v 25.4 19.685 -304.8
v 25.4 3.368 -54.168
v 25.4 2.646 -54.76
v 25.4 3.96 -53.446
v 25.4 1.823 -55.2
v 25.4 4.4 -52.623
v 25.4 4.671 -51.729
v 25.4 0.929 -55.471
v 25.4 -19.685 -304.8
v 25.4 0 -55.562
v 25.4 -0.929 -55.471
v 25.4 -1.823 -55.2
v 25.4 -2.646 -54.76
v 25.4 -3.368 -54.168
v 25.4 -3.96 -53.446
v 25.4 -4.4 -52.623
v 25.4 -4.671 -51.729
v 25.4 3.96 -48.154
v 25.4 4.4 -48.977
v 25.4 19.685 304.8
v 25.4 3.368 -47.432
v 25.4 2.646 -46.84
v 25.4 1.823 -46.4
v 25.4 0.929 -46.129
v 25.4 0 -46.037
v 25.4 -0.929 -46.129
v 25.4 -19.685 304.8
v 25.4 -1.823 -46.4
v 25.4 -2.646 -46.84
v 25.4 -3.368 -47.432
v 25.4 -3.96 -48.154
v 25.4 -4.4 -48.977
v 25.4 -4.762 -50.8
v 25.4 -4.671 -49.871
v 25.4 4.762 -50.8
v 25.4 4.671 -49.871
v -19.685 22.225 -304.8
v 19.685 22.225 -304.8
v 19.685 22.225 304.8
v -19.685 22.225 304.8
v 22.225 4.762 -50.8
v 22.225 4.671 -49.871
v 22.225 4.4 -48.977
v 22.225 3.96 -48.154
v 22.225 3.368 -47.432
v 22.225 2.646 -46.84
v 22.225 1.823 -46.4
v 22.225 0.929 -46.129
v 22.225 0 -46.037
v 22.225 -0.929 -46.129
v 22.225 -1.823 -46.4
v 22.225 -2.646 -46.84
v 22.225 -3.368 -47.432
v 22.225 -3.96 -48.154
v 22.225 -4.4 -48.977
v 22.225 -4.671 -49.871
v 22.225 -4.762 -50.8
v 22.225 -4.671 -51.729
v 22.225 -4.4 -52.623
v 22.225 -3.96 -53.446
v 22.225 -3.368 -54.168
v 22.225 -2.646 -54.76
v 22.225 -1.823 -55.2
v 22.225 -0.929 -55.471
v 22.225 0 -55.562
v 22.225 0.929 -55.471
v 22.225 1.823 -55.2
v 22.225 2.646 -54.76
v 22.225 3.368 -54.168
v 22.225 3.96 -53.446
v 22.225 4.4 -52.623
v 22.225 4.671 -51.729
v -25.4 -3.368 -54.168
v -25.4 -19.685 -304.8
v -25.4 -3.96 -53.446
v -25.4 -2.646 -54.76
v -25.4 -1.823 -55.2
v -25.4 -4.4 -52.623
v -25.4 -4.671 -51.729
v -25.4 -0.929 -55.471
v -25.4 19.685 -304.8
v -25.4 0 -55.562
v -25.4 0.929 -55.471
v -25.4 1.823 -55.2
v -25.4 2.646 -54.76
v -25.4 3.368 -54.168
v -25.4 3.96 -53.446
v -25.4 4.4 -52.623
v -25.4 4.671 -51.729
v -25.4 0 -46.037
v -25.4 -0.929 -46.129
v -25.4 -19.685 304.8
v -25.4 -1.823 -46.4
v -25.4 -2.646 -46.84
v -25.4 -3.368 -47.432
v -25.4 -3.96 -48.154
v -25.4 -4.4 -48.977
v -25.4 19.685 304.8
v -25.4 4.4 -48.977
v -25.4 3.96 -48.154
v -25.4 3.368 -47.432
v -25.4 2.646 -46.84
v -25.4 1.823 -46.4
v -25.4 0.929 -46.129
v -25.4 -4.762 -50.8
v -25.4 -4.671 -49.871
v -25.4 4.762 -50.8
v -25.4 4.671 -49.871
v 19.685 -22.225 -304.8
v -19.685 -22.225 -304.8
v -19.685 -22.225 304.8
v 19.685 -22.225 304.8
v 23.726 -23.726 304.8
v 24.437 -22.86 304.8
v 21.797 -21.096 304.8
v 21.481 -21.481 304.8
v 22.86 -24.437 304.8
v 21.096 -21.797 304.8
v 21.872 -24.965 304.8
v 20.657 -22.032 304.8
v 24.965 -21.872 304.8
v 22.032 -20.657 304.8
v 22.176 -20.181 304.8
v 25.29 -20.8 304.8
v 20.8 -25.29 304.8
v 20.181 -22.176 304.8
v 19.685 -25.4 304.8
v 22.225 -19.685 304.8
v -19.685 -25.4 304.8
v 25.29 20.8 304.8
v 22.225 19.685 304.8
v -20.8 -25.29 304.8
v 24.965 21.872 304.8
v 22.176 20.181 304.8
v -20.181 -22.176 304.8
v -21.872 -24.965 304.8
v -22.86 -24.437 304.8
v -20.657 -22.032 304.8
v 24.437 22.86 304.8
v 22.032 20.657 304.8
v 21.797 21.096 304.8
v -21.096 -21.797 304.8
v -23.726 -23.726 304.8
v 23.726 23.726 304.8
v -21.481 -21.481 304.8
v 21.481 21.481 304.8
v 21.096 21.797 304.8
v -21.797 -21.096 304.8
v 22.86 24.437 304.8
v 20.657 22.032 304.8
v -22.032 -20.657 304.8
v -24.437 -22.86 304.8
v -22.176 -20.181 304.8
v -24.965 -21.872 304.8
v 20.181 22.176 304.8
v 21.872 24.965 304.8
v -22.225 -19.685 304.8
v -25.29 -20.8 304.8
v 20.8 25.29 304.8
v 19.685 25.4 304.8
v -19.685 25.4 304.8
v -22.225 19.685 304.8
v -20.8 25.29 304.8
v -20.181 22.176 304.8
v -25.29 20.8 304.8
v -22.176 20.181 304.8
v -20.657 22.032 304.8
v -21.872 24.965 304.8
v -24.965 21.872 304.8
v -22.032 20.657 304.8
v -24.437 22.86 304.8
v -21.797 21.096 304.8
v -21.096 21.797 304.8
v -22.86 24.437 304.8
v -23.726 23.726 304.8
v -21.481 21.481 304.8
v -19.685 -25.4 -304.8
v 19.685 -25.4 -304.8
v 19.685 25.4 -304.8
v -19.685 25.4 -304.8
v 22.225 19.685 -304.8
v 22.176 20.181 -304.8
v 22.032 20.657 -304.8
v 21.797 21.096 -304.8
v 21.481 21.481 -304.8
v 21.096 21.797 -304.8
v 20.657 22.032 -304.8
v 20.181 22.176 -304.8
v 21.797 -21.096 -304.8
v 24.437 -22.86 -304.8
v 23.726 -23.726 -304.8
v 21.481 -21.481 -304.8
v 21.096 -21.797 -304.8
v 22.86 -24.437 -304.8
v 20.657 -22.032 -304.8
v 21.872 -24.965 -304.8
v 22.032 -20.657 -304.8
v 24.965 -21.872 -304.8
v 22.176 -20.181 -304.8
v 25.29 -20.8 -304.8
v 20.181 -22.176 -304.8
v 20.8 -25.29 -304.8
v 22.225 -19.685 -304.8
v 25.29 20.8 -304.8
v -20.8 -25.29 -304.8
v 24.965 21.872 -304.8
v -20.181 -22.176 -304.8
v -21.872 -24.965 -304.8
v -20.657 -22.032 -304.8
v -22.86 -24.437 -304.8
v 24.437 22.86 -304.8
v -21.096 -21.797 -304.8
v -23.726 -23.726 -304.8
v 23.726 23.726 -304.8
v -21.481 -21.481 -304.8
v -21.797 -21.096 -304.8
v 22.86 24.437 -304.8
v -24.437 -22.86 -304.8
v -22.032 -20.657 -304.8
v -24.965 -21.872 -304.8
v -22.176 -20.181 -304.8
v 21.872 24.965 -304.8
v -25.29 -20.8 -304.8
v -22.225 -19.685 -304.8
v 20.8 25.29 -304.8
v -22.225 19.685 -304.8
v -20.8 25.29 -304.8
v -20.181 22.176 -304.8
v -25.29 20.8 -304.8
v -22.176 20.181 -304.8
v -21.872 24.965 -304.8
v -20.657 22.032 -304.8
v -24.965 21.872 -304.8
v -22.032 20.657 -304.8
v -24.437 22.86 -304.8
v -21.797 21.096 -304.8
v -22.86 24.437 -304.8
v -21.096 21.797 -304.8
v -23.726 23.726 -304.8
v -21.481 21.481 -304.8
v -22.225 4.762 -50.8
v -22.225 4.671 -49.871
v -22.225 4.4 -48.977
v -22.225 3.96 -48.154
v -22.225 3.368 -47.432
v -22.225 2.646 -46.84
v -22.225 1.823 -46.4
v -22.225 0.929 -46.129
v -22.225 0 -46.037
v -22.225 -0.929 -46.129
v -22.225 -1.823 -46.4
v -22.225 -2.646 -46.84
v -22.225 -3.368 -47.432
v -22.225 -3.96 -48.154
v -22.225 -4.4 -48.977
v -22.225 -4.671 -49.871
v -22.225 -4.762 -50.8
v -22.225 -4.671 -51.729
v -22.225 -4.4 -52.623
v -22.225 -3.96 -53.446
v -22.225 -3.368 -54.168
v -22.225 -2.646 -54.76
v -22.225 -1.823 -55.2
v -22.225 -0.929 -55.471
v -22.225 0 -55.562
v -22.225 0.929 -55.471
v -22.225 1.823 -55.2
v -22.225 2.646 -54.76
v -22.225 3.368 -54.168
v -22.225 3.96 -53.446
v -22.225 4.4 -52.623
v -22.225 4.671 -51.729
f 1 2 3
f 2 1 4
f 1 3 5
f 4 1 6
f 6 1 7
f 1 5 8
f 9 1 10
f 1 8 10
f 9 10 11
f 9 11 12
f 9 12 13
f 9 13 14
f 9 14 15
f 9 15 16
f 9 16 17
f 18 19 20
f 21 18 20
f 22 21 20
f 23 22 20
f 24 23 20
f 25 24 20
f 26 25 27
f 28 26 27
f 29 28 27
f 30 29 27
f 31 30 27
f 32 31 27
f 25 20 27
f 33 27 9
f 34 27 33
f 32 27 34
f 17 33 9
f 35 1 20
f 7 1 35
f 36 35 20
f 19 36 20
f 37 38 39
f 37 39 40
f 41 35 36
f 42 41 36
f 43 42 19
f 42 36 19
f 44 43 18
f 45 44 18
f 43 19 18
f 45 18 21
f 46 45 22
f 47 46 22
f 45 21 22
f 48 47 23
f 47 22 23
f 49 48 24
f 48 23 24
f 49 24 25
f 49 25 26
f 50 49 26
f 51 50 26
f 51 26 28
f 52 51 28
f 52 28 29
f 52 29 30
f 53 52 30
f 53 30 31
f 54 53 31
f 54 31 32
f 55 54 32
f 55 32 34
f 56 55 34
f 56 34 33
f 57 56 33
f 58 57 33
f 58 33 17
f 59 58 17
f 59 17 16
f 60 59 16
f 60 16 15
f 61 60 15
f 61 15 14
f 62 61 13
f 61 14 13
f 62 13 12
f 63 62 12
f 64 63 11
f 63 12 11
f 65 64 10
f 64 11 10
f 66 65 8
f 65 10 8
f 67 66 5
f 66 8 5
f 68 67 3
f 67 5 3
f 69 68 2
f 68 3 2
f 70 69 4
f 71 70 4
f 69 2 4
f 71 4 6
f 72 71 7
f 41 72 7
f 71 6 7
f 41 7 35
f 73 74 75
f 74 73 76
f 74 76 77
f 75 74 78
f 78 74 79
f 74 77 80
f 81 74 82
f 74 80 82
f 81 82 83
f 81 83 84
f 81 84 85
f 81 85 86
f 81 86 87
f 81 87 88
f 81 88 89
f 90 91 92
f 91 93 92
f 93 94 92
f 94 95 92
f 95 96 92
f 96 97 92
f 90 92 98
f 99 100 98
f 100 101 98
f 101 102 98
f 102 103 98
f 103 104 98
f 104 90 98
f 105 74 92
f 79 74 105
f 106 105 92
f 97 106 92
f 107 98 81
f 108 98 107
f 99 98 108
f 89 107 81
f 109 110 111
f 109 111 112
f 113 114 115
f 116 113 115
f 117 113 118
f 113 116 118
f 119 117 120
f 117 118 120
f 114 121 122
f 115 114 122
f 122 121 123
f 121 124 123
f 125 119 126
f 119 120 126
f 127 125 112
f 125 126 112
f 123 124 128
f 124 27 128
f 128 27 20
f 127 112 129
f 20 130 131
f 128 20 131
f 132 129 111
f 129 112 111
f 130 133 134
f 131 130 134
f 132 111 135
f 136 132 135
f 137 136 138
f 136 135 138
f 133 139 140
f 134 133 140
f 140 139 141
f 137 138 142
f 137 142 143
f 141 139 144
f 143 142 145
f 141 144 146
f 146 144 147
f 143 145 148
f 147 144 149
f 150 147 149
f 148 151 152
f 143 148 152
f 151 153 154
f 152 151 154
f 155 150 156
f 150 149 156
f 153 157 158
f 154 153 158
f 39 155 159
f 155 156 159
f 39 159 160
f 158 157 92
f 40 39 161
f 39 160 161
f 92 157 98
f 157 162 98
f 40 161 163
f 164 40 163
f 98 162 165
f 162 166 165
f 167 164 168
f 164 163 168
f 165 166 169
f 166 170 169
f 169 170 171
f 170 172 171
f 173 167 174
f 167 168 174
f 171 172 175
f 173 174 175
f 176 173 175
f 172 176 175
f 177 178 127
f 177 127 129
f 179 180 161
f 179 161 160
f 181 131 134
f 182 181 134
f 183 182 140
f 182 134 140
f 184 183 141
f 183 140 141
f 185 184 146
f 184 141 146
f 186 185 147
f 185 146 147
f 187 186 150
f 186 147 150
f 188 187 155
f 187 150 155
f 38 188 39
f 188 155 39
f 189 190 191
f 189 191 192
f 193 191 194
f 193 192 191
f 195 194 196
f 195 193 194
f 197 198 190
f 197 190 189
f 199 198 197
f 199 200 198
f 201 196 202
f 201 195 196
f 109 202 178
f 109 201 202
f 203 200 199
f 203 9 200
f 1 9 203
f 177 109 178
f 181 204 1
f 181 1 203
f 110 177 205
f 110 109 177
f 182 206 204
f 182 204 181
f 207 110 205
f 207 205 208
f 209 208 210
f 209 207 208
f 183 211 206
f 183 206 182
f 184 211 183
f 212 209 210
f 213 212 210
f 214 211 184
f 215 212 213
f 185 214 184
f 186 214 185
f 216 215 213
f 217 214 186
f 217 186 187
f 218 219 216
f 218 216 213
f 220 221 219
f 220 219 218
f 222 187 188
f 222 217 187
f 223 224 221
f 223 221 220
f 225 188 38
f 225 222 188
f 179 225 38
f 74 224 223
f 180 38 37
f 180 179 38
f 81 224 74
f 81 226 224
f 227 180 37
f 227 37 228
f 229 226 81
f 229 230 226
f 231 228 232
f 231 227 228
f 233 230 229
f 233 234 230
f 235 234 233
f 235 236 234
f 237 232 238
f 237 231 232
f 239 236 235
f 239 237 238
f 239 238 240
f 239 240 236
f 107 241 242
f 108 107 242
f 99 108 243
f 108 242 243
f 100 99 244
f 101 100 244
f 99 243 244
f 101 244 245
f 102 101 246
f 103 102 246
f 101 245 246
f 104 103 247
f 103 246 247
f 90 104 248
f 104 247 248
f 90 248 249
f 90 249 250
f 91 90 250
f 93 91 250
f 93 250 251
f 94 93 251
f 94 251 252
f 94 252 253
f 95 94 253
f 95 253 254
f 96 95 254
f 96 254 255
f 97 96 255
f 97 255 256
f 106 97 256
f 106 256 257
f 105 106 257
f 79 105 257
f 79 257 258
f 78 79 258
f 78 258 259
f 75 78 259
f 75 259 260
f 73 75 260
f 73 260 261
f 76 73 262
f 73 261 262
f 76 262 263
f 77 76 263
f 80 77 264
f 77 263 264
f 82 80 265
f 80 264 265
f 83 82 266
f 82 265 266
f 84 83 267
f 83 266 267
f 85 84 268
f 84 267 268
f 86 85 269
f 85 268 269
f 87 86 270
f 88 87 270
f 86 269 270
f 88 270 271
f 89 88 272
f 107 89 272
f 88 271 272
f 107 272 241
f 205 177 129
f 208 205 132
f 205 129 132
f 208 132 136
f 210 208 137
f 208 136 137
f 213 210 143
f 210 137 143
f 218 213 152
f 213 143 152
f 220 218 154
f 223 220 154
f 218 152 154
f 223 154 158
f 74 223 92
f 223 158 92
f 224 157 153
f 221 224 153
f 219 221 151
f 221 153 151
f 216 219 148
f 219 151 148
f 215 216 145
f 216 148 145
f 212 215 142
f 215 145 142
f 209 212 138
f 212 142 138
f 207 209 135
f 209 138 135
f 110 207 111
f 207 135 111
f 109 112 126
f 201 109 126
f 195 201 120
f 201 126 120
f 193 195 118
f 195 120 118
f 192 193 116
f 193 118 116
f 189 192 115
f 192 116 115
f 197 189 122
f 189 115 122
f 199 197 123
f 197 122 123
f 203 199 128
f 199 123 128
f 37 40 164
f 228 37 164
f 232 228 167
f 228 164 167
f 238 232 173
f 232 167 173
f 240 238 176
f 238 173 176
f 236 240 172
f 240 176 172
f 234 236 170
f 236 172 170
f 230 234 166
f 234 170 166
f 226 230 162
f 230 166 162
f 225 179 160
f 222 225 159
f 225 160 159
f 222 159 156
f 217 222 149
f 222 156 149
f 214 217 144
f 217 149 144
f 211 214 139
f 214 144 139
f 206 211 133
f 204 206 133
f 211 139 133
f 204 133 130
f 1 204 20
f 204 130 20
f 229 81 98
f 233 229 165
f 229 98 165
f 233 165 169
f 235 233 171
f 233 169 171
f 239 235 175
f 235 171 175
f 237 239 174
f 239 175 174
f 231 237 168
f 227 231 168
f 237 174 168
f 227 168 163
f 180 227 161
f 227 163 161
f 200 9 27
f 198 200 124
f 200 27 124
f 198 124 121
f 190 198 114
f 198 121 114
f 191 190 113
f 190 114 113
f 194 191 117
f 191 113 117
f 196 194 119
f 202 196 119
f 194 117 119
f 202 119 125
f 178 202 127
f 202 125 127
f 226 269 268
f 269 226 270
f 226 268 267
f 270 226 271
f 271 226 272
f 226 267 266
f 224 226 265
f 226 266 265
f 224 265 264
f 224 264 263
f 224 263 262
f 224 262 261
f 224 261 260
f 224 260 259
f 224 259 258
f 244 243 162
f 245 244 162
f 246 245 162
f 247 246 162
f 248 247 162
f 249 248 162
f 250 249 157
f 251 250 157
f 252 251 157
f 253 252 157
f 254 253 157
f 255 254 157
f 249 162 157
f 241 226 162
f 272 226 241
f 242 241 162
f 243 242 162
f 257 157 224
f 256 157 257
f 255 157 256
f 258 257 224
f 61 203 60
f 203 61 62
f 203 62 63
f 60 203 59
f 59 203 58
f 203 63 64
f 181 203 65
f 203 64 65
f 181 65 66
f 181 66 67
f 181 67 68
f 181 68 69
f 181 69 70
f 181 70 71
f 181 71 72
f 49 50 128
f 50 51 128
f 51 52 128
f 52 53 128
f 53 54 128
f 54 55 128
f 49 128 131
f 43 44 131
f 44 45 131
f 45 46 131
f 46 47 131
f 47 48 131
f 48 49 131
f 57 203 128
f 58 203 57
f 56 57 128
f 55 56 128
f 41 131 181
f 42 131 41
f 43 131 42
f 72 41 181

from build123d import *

# Parameters (mm, degrees)
BOSS_EXTRUDE1_DEPTH = 304.8
SKETCH3_R           = 4.7625
CUT_EXTRUDE2_DEPTH  = 76.2


with BuildPart() as part:
    # Sketch1 → Boss-Extrude1 (new, symmetric)
    with BuildSketch(Plane.XY):
        with BuildLine():
            Line((-19.685, 25.4), (19.685, 25.4))
            ThreePointArc((19.685, 25.4), (23.726115254, 23.726115254), (25.4, 19.685))
            Line((25.4, 19.685), (25.4, -19.685))
            ThreePointArc((25.4, -19.685), (23.726115254, -23.726115254), (19.685, -25.4))
            Line((19.685, -25.4), (-19.685, -25.4))
            ThreePointArc((-19.685, -25.4), (-23.726115254, -23.726115254), (-25.4, -19.685))
            Line((-25.4, -19.685), (-25.4, 19.685))
            ThreePointArc((-25.4, 19.685), (-23.726115254, 23.726115254), (-19.685, 25.4))
        make_face()
        with BuildLine():
            Line((-19.685, -22.225), (19.685, -22.225))
            ThreePointArc((19.685, -22.225), (21.481051224, -21.481051224), (22.225, -19.685))
            Line((22.225, -19.685), (22.225, 19.685))
            ThreePointArc((22.225, 19.685), (21.481051224, 21.481051224), (19.685, 22.225))
            Line((19.685, 22.225), (-19.685, 22.225))
            ThreePointArc((-19.685, 22.225), (-21.481051224, 21.481051224), (-22.225, 19.685))
            Line((-22.225, 19.685), (-22.225, -19.685))
            ThreePointArc((-22.225, -19.685), (-21.481051224, -21.481051224), (-19.685, -22.225))
        make_face(mode=Mode.SUBTRACT)
    extrude(amount=BOSS_EXTRUDE1_DEPTH, both=True)

    # Sketch3 → Cut-Extrude2 (cut)
    with BuildSketch(Plane(origin=(25.4, 0, 0), x_dir=(0, 0, -1), z_dir=(1, 0, 0))):
        with Locations(Location((50.8, 0, 0), (0, 0, 90))):
            Circle(SKETCH3_R)
    extrude(amount=-CUT_EXTRUDE2_DEPTH, mode=Mode.SUBTRACT)


solid = part.part
